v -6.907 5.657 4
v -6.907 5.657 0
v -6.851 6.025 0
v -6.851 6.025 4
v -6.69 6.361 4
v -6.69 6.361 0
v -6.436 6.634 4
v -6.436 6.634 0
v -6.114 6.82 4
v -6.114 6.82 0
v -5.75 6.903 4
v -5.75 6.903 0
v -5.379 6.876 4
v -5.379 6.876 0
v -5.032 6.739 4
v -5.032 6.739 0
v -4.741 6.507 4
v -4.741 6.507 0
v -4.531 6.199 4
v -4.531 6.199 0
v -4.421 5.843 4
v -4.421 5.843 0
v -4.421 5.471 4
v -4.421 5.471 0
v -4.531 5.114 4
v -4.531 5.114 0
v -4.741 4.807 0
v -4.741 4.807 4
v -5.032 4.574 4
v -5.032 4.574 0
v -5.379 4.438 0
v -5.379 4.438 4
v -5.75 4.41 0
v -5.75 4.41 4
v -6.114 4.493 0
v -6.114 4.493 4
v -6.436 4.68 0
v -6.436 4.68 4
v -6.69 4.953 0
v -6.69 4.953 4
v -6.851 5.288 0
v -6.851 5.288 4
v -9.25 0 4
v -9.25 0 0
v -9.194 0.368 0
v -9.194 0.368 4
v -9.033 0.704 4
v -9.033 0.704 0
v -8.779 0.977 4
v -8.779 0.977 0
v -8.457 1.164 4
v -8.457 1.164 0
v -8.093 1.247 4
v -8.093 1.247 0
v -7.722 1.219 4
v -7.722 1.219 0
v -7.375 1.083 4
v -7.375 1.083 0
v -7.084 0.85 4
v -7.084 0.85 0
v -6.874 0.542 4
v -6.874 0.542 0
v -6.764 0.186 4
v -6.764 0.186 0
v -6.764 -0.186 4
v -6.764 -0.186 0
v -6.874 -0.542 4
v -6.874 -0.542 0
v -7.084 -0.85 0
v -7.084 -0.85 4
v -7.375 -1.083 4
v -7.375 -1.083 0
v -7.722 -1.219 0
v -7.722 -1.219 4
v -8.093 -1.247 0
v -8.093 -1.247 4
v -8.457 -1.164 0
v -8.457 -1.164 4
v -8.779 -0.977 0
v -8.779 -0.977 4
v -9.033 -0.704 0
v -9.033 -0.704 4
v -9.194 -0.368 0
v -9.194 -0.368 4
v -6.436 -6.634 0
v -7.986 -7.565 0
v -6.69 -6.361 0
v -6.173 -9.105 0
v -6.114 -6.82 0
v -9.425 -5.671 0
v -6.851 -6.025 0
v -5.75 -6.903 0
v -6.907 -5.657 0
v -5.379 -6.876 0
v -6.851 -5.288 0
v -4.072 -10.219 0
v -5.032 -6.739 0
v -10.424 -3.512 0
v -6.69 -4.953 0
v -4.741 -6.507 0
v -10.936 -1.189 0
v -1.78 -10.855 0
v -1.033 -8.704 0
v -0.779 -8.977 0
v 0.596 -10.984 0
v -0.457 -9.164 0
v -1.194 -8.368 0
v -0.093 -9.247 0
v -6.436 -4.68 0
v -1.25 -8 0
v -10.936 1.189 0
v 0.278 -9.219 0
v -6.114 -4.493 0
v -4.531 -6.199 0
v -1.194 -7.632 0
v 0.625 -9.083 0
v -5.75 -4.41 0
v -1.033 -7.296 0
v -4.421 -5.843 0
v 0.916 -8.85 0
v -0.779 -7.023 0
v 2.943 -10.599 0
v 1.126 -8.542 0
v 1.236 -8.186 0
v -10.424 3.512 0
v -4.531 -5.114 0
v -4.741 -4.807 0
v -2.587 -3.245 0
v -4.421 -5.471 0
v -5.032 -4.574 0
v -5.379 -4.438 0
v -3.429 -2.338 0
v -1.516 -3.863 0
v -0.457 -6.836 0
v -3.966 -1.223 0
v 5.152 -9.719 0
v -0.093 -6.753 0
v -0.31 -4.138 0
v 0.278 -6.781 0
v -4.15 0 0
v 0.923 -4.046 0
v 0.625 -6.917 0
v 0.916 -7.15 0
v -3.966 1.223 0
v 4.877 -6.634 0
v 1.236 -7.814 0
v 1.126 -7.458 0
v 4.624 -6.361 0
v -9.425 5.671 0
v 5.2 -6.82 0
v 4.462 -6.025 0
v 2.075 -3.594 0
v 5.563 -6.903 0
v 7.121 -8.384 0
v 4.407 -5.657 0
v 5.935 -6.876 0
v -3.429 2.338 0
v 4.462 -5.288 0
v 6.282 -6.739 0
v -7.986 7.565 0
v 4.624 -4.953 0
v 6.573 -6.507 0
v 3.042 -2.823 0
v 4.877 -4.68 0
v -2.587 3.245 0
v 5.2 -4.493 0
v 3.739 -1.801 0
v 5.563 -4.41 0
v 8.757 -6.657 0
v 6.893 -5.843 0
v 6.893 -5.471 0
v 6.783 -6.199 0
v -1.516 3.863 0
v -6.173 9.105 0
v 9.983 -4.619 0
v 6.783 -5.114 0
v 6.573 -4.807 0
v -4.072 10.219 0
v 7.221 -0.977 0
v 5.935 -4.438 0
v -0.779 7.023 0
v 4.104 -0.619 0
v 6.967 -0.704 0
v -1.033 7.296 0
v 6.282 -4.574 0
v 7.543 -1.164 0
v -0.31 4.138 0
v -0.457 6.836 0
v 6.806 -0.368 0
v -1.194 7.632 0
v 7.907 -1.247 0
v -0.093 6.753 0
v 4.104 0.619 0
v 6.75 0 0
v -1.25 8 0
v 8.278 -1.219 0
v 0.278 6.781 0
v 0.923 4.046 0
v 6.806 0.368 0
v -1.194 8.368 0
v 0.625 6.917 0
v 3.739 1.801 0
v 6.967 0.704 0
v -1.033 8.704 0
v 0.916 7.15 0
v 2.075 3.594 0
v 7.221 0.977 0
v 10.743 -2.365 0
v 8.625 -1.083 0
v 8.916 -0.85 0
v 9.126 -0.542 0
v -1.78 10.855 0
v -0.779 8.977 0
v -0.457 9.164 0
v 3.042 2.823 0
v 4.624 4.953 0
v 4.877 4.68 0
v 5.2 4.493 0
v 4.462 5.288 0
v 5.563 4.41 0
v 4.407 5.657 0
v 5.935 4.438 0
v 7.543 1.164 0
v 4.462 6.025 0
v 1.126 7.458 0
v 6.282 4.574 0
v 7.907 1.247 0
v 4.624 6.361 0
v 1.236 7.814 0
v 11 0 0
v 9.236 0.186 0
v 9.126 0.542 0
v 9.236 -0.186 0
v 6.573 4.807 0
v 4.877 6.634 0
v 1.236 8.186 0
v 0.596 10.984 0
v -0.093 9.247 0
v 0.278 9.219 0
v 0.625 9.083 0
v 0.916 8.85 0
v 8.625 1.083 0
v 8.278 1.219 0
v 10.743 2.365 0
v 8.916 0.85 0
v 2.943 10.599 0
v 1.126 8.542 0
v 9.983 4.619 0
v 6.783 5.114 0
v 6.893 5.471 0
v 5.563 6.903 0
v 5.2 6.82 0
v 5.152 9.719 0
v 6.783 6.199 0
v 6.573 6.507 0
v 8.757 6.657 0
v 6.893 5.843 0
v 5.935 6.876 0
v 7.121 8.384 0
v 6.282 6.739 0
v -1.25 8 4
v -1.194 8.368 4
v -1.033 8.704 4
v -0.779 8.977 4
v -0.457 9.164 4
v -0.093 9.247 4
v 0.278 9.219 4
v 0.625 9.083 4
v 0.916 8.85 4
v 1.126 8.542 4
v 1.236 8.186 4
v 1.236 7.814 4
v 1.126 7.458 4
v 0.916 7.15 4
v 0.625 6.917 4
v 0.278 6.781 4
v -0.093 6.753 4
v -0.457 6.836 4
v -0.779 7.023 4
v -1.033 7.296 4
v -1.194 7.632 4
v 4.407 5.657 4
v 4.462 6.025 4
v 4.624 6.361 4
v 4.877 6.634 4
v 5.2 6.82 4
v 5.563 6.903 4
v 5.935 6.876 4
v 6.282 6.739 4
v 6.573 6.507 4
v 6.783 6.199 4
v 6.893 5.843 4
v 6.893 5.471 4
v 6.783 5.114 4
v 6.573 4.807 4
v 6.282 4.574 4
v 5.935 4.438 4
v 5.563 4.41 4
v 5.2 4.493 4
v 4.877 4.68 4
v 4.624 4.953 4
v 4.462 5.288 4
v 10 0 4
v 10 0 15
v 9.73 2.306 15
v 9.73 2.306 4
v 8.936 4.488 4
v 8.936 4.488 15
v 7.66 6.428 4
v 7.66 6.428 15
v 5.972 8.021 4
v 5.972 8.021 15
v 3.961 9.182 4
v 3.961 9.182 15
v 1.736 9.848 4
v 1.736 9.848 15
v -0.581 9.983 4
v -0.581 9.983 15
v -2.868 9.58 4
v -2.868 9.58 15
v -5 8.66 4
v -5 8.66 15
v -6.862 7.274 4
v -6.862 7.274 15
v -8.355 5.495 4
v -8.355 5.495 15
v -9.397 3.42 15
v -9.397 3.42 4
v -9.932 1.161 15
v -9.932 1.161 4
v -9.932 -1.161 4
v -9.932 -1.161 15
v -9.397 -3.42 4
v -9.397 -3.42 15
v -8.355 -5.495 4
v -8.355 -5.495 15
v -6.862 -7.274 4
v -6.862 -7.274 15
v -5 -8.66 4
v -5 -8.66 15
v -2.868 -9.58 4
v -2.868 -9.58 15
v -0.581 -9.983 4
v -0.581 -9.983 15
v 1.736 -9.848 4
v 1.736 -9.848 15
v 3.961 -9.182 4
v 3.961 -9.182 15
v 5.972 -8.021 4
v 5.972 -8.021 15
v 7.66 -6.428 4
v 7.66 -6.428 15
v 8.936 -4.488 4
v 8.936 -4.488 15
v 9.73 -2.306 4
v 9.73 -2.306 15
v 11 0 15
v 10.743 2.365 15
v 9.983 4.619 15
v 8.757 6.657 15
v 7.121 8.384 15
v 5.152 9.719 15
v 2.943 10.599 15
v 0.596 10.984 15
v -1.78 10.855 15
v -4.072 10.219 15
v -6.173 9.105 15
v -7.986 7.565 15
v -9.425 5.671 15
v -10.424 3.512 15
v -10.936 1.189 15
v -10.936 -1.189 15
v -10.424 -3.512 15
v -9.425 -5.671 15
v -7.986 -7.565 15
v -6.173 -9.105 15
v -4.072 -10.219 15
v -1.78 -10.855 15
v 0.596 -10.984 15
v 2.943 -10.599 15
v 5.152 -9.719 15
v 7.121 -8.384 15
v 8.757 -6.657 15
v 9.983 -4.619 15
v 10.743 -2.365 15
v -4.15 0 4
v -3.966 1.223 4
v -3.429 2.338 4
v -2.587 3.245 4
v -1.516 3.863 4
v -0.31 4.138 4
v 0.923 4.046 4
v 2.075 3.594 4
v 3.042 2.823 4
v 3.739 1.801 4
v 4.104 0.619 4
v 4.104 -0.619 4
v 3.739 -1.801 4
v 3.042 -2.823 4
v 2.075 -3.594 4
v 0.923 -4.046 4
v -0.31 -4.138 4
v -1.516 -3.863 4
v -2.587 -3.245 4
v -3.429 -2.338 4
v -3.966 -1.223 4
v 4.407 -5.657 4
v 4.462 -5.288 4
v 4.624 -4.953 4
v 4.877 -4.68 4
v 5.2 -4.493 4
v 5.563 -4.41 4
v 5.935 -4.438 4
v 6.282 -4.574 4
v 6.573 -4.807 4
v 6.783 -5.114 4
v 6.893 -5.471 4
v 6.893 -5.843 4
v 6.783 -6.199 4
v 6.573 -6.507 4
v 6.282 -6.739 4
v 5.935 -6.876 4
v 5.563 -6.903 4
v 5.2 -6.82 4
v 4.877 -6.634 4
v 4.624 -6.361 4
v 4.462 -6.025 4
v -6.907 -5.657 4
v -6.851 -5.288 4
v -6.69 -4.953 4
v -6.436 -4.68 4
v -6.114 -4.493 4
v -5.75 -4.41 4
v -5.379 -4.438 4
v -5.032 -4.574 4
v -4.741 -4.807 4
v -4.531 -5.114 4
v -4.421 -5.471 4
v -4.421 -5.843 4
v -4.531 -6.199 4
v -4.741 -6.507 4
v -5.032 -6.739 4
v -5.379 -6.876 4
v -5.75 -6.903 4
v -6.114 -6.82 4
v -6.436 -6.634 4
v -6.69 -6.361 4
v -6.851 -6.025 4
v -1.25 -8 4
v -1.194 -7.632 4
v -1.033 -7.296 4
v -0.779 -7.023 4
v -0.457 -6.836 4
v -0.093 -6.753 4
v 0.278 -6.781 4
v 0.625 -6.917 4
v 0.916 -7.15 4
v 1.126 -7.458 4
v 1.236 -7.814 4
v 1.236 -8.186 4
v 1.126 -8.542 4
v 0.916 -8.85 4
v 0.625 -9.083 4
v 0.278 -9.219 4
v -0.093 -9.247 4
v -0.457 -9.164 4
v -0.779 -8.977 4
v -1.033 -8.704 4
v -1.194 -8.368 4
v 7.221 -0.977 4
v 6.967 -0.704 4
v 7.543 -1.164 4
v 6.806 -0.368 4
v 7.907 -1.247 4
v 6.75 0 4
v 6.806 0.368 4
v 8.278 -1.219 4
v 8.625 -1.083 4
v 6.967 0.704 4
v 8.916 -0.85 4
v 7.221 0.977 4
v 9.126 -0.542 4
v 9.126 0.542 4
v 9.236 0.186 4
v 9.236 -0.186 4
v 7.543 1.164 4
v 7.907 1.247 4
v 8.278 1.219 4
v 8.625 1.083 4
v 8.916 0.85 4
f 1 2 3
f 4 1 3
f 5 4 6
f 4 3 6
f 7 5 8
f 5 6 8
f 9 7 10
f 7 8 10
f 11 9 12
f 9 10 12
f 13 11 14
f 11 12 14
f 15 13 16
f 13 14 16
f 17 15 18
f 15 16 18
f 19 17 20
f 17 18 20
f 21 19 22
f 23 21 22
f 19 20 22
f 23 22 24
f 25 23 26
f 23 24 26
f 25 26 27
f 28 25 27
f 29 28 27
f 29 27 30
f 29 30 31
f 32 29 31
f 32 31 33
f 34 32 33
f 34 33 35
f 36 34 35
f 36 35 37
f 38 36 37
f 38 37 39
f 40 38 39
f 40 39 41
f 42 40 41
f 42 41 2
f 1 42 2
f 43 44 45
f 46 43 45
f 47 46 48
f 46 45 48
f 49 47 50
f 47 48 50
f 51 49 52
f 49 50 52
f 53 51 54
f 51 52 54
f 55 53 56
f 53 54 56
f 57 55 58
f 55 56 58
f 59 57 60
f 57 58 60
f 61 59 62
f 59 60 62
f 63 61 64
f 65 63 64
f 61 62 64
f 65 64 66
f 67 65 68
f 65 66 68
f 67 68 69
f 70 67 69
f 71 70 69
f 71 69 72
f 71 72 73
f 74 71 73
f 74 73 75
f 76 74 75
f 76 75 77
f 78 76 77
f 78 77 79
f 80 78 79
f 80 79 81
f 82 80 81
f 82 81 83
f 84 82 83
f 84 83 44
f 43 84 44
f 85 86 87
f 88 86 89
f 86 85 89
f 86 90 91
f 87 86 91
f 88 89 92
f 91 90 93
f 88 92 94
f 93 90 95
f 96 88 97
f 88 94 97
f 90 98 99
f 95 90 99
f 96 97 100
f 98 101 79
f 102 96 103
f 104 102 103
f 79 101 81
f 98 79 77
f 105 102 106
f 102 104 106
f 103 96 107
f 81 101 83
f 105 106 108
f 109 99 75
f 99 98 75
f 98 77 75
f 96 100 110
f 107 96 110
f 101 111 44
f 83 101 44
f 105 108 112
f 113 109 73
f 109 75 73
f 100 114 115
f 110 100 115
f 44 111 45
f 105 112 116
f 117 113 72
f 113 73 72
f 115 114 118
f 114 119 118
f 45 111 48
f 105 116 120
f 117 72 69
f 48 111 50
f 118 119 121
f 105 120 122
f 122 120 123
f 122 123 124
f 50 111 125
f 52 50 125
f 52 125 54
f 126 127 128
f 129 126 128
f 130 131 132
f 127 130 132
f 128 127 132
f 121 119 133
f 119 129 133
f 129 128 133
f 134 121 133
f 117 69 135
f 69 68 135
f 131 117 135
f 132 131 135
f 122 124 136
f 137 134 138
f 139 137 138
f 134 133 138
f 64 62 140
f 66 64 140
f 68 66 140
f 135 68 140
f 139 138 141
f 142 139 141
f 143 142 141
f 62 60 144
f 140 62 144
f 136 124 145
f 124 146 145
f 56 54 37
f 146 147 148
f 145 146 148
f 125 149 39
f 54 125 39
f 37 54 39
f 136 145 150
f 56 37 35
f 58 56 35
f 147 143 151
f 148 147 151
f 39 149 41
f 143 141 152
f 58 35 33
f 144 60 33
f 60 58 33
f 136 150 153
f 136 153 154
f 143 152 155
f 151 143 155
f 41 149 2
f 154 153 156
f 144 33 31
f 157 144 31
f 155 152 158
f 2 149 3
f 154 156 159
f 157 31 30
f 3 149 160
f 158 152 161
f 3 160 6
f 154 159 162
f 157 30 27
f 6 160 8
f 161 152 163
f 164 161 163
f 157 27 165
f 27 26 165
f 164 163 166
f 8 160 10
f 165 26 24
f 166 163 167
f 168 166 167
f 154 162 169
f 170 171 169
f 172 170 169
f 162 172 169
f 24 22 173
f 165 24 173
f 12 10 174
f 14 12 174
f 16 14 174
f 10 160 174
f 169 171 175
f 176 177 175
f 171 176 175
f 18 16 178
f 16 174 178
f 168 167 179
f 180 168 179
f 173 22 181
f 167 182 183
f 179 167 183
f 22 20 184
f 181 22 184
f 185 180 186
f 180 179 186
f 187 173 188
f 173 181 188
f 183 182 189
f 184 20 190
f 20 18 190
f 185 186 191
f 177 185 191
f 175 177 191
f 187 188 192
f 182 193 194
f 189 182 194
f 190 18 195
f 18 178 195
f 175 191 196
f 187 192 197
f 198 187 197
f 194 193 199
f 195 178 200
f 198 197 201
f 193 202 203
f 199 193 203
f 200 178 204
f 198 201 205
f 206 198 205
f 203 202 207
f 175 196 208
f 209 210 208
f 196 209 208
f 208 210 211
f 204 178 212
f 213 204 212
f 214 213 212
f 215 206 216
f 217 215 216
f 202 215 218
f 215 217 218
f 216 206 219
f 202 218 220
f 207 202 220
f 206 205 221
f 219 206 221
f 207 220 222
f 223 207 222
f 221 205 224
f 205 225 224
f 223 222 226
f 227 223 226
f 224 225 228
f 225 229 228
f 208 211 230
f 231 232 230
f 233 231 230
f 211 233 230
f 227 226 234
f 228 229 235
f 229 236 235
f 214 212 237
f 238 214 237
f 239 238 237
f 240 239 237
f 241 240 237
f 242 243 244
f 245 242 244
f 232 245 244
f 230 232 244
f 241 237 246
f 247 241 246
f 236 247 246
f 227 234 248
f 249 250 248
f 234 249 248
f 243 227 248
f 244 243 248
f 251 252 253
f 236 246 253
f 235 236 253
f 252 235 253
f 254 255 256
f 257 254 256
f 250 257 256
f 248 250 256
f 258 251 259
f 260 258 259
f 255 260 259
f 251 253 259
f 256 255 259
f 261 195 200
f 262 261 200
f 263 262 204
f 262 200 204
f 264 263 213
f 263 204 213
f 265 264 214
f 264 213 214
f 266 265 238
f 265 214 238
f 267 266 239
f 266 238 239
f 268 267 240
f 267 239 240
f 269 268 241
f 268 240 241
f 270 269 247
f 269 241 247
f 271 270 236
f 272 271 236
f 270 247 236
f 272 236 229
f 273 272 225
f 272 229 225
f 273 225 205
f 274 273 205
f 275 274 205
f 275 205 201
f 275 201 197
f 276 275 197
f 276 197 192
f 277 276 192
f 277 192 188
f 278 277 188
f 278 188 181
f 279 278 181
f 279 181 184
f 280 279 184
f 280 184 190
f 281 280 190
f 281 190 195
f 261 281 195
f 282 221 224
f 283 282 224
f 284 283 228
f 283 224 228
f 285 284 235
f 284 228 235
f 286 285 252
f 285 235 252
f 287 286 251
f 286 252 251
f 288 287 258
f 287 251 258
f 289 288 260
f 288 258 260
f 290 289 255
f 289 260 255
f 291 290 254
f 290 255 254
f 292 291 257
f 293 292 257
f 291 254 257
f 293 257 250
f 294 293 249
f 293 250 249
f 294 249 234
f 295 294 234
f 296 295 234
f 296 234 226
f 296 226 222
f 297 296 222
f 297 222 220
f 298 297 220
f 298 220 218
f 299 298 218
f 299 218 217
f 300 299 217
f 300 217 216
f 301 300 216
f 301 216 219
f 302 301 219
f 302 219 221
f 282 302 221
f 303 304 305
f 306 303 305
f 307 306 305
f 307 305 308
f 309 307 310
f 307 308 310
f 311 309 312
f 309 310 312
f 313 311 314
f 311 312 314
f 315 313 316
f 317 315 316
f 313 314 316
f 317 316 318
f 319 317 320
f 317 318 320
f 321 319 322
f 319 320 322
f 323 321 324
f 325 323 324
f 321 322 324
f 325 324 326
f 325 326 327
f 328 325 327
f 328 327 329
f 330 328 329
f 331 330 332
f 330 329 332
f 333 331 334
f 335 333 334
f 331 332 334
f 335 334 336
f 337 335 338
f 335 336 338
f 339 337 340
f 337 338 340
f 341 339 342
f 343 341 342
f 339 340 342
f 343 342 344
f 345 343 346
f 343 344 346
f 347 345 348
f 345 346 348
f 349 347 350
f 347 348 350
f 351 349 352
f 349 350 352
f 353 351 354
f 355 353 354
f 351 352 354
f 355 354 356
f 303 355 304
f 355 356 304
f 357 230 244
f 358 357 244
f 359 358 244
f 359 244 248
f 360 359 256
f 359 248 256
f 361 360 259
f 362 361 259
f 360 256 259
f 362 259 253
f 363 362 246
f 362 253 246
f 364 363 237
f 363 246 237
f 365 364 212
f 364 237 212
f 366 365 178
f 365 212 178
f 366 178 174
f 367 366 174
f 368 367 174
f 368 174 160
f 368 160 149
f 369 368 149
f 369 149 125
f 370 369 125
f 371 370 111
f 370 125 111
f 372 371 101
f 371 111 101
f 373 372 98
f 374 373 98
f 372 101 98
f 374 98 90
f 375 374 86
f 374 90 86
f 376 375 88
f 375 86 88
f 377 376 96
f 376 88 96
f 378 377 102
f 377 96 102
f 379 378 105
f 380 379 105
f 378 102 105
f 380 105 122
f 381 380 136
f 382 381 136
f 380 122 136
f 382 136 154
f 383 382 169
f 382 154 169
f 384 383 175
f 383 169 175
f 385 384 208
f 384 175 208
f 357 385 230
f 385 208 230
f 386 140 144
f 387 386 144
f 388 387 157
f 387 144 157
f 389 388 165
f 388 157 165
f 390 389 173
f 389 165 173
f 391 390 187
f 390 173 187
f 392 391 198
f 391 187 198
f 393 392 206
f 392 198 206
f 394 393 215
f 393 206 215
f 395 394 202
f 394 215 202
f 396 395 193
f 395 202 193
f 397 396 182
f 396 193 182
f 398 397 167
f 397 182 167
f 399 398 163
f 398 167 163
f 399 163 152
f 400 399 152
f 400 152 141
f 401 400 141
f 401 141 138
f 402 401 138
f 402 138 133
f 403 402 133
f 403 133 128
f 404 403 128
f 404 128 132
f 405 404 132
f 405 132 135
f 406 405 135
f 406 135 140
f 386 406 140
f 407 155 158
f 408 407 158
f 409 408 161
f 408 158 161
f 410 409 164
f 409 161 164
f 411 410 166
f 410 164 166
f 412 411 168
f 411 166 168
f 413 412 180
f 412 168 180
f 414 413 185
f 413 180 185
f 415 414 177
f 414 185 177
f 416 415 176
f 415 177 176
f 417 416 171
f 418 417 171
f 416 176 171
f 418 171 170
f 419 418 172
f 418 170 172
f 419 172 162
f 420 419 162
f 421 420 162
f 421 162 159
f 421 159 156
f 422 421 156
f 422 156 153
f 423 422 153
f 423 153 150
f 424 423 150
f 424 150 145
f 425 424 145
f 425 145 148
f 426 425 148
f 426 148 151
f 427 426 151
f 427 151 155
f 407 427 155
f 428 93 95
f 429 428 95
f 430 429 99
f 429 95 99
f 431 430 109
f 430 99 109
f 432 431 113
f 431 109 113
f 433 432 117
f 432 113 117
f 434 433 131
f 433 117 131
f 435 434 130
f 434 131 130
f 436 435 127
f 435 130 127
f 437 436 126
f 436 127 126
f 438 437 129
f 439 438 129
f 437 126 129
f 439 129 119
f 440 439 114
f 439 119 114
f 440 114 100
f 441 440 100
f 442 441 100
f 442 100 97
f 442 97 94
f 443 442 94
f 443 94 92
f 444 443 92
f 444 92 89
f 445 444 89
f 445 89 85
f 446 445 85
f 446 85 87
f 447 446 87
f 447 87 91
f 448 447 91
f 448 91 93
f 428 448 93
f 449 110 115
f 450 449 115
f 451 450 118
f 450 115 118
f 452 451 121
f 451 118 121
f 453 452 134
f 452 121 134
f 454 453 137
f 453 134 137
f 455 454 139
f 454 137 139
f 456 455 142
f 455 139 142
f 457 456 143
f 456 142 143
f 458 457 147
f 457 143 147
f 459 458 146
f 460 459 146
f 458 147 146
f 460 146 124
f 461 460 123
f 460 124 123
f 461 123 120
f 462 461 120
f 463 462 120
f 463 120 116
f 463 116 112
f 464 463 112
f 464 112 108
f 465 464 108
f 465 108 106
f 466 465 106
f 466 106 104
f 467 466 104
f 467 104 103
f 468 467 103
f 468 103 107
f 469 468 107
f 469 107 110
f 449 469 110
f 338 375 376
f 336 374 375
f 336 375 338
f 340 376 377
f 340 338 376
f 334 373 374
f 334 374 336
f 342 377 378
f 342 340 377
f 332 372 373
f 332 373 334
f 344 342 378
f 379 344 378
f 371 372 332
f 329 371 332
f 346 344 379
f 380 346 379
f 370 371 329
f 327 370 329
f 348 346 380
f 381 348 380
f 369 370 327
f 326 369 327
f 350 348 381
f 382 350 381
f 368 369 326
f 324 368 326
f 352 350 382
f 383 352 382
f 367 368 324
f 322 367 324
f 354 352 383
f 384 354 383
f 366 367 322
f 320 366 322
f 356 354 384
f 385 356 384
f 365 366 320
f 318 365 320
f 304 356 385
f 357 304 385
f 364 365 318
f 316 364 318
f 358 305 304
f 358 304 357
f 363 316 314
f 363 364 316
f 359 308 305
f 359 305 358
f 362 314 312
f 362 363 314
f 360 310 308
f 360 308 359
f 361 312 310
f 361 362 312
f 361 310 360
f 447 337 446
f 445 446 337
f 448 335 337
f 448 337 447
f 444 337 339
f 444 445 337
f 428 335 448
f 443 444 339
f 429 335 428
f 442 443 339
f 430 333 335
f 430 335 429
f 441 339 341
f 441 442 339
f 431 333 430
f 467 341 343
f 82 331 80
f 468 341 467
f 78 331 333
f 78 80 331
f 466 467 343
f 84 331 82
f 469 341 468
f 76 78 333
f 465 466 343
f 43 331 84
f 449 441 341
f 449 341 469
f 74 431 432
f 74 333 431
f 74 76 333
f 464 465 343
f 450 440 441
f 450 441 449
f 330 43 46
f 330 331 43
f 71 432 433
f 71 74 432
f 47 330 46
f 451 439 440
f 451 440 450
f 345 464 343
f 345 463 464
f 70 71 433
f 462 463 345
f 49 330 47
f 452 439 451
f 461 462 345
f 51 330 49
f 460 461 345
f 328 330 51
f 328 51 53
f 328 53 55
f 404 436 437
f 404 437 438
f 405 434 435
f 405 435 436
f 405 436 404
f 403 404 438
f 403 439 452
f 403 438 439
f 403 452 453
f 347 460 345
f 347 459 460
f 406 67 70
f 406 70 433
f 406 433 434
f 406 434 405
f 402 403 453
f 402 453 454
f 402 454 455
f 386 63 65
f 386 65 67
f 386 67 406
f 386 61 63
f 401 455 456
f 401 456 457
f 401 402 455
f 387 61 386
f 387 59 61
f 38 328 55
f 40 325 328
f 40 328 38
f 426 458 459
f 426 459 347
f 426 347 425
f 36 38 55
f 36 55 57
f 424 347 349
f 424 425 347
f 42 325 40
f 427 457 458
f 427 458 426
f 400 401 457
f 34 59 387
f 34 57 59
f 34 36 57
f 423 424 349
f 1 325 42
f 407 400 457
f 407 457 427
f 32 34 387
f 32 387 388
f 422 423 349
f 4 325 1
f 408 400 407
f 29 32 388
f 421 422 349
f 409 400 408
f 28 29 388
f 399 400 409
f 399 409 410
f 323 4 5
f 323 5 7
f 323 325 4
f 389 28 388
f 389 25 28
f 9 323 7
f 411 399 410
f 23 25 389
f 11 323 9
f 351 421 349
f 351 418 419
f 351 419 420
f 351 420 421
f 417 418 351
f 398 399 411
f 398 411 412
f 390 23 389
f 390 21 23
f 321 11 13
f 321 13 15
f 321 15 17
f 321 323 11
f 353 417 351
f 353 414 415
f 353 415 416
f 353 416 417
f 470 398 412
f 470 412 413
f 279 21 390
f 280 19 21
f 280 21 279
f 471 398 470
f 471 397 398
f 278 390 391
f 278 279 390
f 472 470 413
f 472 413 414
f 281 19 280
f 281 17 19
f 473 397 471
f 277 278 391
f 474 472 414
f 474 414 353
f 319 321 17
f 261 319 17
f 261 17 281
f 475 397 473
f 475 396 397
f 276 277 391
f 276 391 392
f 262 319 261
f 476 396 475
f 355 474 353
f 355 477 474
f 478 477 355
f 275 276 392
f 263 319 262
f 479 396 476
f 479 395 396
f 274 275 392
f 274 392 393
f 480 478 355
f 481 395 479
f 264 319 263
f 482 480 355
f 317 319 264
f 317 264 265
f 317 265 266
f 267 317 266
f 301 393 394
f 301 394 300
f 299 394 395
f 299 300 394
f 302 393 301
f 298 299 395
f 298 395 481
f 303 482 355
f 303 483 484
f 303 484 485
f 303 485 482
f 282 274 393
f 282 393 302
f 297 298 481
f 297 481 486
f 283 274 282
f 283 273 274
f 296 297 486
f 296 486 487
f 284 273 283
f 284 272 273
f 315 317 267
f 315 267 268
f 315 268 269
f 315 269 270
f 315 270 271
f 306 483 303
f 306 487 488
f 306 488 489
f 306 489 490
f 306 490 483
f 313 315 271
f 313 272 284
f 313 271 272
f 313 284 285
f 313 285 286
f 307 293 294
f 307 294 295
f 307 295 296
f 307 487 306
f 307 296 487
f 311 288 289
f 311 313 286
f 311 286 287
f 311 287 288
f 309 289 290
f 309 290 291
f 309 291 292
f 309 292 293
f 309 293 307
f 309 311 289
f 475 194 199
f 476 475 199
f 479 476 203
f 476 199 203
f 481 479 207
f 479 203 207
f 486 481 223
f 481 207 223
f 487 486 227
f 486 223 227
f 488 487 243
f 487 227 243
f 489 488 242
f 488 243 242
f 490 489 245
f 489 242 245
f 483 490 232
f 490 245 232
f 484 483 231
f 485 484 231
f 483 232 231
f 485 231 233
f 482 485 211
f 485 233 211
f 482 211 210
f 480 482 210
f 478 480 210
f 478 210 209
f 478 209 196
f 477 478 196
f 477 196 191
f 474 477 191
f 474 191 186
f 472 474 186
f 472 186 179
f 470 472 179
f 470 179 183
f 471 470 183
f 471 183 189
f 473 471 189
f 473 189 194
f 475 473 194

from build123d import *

# Parameters (mm, degrees)
SKETCH1_R           = 11
BOSS_EXTRUDE1_DEPTH = 15
SKETCH3_R           = 10
CUT_EXTRUDE1_DEPTH  = 11
SKETCH4_R           = 4.15
SKETCH4_R_2         = 1.25
CUT_EXTRUDE2_DEPTH  = 11


with BuildPart() as part:
    # Sketch1 → Boss-Extrude1 (new body)
    with BuildSketch(Plane.XY):
        Circle(SKETCH1_R)
    extrude(amount=BOSS_EXTRUDE1_DEPTH)

    # Sketch3 → Cut-Extrude1 (cut)
    with BuildSketch(Plane.XY.offset(15)):
        Circle(SKETCH3_R)
    extrude(amount=-CUT_EXTRUDE1_DEPTH, mode=Mode.SUBTRACT)

    # Sketch4 → Cut-Extrude2 (cut)
    with BuildSketch(Plane(origin=(0, 0, 0), x_dir=(-1, 0, 0), z_dir=(0, 0, -1))):
        Circle(SKETCH4_R)
        with Locations((0, 8)):
            Circle(SKETCH4_R_2)
        with Locations((5.656854249, 5.656854249)):
            Circle(SKETCH4_R_2)
        with Locations((8, 0)):
            Circle(SKETCH4_R_2)
        with Locations((5.656854249, -5.656854249)):
            Circle(SKETCH4_R_2)
        with Locations((0, -8)):
            Circle(SKETCH4_R_2)
        with Locations((-5.656854249, -5.656854249)):
            Circle(SKETCH4_R_2)
        with Locations((-8, 0)):
            Circle(SKETCH4_R_2)
        with Locations((-5.656854249, 5.656854249)):
            Circle(SKETCH4_R_2)
    extrude(amount=-CUT_EXTRUDE2_DEPTH, mode=Mode.SUBTRACT)


solid = part.part
